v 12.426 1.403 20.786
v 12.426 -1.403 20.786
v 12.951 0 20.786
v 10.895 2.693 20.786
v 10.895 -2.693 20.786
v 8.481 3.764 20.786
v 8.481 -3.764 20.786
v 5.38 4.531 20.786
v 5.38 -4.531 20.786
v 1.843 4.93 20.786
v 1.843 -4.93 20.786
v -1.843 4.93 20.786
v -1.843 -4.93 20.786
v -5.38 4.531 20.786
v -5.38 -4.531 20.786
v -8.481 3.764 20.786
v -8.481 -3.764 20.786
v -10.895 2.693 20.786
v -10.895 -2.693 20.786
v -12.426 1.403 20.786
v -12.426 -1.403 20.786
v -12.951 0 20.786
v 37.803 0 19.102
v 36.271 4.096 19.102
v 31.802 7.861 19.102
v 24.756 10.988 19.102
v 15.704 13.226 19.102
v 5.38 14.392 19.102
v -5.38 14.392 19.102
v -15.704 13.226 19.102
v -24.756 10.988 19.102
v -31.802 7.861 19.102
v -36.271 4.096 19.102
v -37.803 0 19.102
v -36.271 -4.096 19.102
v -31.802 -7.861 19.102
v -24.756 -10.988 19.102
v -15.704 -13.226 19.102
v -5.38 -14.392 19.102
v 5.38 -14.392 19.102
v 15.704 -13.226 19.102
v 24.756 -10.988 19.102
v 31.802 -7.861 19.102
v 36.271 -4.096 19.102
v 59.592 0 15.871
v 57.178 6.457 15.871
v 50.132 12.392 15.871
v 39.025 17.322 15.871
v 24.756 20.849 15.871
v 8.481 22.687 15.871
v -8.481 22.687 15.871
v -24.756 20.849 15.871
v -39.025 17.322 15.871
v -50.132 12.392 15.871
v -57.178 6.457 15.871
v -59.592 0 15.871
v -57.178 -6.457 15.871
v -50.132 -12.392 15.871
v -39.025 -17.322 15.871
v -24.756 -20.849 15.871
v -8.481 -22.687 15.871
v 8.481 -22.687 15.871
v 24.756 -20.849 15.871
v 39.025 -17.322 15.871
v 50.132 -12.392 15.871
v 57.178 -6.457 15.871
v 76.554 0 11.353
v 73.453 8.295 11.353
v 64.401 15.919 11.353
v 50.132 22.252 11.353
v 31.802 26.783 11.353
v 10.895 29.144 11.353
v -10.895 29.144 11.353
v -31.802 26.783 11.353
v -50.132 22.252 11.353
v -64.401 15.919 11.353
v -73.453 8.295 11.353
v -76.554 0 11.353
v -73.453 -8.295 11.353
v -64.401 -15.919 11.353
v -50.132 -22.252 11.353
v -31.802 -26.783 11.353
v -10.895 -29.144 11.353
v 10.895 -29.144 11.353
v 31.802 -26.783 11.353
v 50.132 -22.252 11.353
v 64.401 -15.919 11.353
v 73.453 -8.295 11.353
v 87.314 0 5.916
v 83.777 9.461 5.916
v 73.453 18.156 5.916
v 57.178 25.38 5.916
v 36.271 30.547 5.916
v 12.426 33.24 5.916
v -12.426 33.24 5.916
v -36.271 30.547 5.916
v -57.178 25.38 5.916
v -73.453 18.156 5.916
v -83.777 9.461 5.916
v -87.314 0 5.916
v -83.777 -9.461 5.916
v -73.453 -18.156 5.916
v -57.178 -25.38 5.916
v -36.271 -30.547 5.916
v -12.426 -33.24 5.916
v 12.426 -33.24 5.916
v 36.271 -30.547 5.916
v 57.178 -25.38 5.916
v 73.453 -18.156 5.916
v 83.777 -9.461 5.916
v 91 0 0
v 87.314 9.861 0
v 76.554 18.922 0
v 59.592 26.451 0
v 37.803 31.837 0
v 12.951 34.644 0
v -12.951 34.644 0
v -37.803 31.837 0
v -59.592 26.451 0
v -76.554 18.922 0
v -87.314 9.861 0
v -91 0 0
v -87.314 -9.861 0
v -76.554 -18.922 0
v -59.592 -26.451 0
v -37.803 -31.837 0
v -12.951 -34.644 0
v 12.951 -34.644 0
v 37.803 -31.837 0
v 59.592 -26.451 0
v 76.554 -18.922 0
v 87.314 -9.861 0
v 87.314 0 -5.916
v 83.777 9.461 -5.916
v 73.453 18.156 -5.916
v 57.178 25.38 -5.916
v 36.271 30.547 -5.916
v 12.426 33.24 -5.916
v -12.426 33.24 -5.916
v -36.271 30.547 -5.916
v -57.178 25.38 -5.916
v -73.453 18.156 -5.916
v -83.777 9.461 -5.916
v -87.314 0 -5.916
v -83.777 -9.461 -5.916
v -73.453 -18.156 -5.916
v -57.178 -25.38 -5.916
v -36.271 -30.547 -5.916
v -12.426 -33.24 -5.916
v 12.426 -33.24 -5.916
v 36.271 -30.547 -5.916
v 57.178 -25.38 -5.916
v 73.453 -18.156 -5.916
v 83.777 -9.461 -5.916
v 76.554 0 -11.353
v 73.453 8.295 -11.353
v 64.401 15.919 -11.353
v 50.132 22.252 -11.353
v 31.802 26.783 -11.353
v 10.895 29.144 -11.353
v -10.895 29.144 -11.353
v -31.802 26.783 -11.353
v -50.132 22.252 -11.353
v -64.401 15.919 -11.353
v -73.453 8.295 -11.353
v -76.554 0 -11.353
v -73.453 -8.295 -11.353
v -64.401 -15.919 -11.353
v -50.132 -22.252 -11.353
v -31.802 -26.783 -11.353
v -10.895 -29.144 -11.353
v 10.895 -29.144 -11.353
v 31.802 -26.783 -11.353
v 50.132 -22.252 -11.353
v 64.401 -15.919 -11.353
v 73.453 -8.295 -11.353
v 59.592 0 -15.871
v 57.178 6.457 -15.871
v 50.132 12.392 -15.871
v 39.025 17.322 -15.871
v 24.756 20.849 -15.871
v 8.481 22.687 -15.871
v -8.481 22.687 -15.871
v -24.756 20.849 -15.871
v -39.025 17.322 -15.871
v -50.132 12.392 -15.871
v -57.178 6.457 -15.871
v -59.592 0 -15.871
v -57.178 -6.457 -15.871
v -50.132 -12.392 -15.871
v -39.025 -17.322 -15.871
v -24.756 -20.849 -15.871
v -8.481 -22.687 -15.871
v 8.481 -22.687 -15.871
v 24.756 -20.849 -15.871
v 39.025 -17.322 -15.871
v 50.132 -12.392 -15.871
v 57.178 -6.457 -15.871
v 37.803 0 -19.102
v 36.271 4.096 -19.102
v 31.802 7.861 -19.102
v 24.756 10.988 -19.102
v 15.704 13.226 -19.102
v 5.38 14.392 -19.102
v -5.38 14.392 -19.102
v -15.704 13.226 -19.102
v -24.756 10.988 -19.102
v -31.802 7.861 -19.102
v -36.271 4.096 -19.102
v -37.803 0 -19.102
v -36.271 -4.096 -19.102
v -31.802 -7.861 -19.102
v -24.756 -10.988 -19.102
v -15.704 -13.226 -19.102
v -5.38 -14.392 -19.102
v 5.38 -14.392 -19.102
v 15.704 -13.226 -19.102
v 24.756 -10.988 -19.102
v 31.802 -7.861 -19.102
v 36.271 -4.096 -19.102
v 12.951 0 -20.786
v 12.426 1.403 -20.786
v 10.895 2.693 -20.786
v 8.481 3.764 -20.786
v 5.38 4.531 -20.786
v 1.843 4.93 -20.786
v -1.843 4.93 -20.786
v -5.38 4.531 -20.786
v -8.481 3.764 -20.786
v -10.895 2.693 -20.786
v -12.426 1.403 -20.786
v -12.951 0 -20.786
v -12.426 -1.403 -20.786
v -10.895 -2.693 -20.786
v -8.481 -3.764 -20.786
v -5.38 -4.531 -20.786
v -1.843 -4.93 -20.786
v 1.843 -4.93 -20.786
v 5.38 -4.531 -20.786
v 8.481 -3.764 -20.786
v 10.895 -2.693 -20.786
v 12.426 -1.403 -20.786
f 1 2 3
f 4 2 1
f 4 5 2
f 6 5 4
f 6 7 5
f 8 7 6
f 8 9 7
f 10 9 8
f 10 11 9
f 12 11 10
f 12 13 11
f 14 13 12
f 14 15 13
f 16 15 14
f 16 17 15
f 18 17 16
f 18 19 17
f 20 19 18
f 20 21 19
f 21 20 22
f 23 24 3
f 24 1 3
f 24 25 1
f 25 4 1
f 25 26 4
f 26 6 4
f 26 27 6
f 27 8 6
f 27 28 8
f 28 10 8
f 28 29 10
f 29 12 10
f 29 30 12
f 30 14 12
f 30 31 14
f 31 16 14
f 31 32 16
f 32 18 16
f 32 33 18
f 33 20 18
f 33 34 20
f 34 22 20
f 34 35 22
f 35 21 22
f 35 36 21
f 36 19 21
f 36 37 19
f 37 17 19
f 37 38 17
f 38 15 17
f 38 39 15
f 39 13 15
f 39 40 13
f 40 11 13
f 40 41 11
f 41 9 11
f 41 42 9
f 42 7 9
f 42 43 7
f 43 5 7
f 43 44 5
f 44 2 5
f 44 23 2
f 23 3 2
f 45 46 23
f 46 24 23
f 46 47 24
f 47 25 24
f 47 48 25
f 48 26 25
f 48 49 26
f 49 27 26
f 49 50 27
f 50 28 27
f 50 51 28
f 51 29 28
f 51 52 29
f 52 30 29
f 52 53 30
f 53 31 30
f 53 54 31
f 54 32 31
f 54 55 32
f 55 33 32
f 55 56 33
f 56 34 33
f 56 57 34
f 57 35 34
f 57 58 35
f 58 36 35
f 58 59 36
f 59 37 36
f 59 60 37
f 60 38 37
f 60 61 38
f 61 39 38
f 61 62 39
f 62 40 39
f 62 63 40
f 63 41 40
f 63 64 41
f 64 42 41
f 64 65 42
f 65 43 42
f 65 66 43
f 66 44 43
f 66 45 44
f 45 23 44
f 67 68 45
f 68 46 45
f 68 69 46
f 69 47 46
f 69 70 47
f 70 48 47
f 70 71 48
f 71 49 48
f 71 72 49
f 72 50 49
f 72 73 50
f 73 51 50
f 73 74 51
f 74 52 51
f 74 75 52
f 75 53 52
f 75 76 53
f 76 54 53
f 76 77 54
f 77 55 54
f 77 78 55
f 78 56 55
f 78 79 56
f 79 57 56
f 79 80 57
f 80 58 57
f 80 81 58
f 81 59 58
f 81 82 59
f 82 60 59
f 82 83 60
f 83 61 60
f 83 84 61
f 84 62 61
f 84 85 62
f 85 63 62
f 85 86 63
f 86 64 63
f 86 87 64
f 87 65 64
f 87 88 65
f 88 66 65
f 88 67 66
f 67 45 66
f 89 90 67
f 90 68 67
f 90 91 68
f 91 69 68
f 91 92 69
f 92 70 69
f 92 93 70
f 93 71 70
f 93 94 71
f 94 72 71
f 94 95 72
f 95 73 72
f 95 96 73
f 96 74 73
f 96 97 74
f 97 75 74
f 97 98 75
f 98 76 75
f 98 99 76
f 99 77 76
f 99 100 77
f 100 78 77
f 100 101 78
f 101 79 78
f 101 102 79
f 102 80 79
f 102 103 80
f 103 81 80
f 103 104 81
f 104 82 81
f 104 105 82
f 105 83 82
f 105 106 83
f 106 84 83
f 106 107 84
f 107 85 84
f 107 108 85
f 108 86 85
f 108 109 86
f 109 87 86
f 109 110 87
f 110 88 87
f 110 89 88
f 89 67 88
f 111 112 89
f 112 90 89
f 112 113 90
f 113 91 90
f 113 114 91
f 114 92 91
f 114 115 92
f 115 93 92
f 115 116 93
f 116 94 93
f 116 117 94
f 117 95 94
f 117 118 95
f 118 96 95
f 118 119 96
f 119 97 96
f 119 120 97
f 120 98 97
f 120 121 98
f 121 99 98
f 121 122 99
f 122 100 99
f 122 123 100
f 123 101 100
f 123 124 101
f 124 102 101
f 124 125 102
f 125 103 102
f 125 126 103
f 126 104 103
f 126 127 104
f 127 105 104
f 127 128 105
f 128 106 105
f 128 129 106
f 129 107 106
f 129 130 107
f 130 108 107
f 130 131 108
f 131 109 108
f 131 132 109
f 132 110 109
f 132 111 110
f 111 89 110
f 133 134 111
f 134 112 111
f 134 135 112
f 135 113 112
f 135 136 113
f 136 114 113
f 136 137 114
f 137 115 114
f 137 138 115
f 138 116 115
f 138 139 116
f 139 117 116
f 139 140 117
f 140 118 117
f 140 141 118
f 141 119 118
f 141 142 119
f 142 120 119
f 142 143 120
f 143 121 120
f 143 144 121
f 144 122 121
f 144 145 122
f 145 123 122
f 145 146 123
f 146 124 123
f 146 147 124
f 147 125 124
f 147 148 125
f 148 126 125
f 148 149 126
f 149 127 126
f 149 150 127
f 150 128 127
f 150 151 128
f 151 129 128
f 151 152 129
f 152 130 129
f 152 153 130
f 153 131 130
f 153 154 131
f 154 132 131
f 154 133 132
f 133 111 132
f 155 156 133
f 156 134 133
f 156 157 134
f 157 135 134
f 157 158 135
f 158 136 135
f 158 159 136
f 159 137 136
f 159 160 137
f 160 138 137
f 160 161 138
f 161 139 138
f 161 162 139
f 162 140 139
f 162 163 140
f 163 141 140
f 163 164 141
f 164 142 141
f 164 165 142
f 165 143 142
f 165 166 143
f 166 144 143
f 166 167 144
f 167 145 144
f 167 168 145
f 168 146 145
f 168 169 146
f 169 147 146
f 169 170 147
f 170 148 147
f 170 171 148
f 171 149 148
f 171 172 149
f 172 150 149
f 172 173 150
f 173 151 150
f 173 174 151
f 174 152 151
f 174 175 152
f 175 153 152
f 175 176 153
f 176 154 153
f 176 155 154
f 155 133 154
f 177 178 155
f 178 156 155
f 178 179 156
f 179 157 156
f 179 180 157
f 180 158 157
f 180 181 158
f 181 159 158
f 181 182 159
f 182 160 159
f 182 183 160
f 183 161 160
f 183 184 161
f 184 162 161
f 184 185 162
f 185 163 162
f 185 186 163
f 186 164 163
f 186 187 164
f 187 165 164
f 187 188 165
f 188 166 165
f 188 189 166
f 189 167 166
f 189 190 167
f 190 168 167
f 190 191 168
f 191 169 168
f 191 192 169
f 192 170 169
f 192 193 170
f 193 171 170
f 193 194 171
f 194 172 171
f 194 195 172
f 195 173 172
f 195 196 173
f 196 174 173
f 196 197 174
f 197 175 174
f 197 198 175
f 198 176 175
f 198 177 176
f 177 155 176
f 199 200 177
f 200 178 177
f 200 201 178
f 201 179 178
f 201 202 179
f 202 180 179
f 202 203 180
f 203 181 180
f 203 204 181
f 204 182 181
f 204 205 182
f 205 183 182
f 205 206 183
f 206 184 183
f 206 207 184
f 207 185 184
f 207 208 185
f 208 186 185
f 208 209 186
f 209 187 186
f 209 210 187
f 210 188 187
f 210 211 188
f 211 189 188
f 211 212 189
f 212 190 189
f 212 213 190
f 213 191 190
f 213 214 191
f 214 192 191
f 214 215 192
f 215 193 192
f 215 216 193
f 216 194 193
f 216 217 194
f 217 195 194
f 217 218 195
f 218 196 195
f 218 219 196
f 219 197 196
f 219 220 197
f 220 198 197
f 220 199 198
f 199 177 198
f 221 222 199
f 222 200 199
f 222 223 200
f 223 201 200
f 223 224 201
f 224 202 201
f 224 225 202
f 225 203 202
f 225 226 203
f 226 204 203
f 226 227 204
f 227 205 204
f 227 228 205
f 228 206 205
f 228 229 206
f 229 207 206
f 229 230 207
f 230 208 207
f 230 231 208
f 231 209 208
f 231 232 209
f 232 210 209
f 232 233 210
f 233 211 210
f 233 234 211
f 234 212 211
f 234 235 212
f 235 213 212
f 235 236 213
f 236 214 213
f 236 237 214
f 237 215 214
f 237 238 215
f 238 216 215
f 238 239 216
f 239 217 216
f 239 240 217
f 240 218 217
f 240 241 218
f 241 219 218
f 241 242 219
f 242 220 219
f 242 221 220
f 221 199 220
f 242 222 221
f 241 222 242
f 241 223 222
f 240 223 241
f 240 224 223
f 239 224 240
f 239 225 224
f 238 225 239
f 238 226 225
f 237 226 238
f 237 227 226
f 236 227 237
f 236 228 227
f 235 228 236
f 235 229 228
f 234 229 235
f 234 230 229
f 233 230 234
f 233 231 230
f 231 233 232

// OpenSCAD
// Generated by SolidPython 1.0.1 on 2020-07-29 00:46:50


scale(v = [13, 5, 3]) {
	sphere(r = 7);
}
/***********************************************
*********      SolidPython code:      **********
************************************************
 
# import packages: SolidPython
from solid import *
from solid.utils import *
from itertools import chain, combinations, permutations


class Resize:

    def __init__(self, scad_file):
        self.scad_file = scad_file
        #self.scad_file = import_scad(scad_file)
        # cone/cylinder param:
        self.r1 = 0
        self.r2 = 0
        self.h = 0
        # rectangular prism param:
        self.w = 0
        self.l = 0
        # ellipse param:
        self.r = 0

    # import OpenScad code (file name corresponds to shape)


    # classify shape + parameters
    def assign(self, param1, param2, param3):
        if self.scad_file == 'cone.scad':
            self.r1 = param1
            self.r2 = param2
            self.h = param3
        elif self.scad_file == 'cylinder.scad':
            self.r1 = param1
            self.r2 = param2
            self.h = param3
        elif self.scad_file == 'rectangularPrism.scad':
            self.h = param1
            self.l = param2
            self.w = param3
        else:
            self.r = param1
            self.h = param2

    # resize parameters
    def iterate(self):
        x = range(3, 20, 2)
        i = 1
        if self.scad_file == 'cone.scad':
            tempList = list(permutations(x, 2))
            for temp in tempList:
                param1 = temp[0]
                param2 = temp[1]
                filepath = 'produced_scad_files/' + 'cone' + str(param1) + '_' + str(param2) + '_' + '.scad'
                scad_render_to_file(cylinder(h=param1, r1=param2, r2=0), filepath)

        elif self.scad_file == 'cylinder.scad':
            tempList = list(permutations(x, 3))
            for temp in tempList:
                param1 = temp[0]
                param2 = temp[1]
                filepath = 'produced_scad_files/' + 'cylinder' + str(param1) + '_' + str(param2) + '_' + '.scad'
                scad_render_to_file(cylinder(h=param1, r1=param2, r2=param2), filepath)

        elif self.scad_file == 'rectangularPrism.scad':
            tempList = list(permutations(x, 3))
            for temp in tempList:
                param1 = temp[0]
                param2 = temp[1]
                param3 = temp[2]
                filepath = 'produced_scad_files/' + 'rectangularPrism' + str(param1) + '_' + str(param2) + '_' + str(
                    param3) + '.scad'
                scad_render_to_file(cube(size=(param1, param2, param3)), filepath)

        elif self.scad_file == 'ellipse.scad':
            tempList = list(permutations(x, 4))
            for temp in tempList:
                param1 = temp[0]
                param2 = temp[1]
                param3 = temp[2]
                param4 = temp[3]
                filepath = 'produced_scad_files/' + 'ellipse' + str(param1) + '_' + str(param2) + '_' + str(param3) + '_' + str(param4) + '.scad'
                scad_render_to_file(scale([param1, param2, param3])(sphere(r=param4)), filepath)

    def render_to_scadfile(self):
        scad_render_to_file(scad, 'example.scad') 
 
************************************************/
